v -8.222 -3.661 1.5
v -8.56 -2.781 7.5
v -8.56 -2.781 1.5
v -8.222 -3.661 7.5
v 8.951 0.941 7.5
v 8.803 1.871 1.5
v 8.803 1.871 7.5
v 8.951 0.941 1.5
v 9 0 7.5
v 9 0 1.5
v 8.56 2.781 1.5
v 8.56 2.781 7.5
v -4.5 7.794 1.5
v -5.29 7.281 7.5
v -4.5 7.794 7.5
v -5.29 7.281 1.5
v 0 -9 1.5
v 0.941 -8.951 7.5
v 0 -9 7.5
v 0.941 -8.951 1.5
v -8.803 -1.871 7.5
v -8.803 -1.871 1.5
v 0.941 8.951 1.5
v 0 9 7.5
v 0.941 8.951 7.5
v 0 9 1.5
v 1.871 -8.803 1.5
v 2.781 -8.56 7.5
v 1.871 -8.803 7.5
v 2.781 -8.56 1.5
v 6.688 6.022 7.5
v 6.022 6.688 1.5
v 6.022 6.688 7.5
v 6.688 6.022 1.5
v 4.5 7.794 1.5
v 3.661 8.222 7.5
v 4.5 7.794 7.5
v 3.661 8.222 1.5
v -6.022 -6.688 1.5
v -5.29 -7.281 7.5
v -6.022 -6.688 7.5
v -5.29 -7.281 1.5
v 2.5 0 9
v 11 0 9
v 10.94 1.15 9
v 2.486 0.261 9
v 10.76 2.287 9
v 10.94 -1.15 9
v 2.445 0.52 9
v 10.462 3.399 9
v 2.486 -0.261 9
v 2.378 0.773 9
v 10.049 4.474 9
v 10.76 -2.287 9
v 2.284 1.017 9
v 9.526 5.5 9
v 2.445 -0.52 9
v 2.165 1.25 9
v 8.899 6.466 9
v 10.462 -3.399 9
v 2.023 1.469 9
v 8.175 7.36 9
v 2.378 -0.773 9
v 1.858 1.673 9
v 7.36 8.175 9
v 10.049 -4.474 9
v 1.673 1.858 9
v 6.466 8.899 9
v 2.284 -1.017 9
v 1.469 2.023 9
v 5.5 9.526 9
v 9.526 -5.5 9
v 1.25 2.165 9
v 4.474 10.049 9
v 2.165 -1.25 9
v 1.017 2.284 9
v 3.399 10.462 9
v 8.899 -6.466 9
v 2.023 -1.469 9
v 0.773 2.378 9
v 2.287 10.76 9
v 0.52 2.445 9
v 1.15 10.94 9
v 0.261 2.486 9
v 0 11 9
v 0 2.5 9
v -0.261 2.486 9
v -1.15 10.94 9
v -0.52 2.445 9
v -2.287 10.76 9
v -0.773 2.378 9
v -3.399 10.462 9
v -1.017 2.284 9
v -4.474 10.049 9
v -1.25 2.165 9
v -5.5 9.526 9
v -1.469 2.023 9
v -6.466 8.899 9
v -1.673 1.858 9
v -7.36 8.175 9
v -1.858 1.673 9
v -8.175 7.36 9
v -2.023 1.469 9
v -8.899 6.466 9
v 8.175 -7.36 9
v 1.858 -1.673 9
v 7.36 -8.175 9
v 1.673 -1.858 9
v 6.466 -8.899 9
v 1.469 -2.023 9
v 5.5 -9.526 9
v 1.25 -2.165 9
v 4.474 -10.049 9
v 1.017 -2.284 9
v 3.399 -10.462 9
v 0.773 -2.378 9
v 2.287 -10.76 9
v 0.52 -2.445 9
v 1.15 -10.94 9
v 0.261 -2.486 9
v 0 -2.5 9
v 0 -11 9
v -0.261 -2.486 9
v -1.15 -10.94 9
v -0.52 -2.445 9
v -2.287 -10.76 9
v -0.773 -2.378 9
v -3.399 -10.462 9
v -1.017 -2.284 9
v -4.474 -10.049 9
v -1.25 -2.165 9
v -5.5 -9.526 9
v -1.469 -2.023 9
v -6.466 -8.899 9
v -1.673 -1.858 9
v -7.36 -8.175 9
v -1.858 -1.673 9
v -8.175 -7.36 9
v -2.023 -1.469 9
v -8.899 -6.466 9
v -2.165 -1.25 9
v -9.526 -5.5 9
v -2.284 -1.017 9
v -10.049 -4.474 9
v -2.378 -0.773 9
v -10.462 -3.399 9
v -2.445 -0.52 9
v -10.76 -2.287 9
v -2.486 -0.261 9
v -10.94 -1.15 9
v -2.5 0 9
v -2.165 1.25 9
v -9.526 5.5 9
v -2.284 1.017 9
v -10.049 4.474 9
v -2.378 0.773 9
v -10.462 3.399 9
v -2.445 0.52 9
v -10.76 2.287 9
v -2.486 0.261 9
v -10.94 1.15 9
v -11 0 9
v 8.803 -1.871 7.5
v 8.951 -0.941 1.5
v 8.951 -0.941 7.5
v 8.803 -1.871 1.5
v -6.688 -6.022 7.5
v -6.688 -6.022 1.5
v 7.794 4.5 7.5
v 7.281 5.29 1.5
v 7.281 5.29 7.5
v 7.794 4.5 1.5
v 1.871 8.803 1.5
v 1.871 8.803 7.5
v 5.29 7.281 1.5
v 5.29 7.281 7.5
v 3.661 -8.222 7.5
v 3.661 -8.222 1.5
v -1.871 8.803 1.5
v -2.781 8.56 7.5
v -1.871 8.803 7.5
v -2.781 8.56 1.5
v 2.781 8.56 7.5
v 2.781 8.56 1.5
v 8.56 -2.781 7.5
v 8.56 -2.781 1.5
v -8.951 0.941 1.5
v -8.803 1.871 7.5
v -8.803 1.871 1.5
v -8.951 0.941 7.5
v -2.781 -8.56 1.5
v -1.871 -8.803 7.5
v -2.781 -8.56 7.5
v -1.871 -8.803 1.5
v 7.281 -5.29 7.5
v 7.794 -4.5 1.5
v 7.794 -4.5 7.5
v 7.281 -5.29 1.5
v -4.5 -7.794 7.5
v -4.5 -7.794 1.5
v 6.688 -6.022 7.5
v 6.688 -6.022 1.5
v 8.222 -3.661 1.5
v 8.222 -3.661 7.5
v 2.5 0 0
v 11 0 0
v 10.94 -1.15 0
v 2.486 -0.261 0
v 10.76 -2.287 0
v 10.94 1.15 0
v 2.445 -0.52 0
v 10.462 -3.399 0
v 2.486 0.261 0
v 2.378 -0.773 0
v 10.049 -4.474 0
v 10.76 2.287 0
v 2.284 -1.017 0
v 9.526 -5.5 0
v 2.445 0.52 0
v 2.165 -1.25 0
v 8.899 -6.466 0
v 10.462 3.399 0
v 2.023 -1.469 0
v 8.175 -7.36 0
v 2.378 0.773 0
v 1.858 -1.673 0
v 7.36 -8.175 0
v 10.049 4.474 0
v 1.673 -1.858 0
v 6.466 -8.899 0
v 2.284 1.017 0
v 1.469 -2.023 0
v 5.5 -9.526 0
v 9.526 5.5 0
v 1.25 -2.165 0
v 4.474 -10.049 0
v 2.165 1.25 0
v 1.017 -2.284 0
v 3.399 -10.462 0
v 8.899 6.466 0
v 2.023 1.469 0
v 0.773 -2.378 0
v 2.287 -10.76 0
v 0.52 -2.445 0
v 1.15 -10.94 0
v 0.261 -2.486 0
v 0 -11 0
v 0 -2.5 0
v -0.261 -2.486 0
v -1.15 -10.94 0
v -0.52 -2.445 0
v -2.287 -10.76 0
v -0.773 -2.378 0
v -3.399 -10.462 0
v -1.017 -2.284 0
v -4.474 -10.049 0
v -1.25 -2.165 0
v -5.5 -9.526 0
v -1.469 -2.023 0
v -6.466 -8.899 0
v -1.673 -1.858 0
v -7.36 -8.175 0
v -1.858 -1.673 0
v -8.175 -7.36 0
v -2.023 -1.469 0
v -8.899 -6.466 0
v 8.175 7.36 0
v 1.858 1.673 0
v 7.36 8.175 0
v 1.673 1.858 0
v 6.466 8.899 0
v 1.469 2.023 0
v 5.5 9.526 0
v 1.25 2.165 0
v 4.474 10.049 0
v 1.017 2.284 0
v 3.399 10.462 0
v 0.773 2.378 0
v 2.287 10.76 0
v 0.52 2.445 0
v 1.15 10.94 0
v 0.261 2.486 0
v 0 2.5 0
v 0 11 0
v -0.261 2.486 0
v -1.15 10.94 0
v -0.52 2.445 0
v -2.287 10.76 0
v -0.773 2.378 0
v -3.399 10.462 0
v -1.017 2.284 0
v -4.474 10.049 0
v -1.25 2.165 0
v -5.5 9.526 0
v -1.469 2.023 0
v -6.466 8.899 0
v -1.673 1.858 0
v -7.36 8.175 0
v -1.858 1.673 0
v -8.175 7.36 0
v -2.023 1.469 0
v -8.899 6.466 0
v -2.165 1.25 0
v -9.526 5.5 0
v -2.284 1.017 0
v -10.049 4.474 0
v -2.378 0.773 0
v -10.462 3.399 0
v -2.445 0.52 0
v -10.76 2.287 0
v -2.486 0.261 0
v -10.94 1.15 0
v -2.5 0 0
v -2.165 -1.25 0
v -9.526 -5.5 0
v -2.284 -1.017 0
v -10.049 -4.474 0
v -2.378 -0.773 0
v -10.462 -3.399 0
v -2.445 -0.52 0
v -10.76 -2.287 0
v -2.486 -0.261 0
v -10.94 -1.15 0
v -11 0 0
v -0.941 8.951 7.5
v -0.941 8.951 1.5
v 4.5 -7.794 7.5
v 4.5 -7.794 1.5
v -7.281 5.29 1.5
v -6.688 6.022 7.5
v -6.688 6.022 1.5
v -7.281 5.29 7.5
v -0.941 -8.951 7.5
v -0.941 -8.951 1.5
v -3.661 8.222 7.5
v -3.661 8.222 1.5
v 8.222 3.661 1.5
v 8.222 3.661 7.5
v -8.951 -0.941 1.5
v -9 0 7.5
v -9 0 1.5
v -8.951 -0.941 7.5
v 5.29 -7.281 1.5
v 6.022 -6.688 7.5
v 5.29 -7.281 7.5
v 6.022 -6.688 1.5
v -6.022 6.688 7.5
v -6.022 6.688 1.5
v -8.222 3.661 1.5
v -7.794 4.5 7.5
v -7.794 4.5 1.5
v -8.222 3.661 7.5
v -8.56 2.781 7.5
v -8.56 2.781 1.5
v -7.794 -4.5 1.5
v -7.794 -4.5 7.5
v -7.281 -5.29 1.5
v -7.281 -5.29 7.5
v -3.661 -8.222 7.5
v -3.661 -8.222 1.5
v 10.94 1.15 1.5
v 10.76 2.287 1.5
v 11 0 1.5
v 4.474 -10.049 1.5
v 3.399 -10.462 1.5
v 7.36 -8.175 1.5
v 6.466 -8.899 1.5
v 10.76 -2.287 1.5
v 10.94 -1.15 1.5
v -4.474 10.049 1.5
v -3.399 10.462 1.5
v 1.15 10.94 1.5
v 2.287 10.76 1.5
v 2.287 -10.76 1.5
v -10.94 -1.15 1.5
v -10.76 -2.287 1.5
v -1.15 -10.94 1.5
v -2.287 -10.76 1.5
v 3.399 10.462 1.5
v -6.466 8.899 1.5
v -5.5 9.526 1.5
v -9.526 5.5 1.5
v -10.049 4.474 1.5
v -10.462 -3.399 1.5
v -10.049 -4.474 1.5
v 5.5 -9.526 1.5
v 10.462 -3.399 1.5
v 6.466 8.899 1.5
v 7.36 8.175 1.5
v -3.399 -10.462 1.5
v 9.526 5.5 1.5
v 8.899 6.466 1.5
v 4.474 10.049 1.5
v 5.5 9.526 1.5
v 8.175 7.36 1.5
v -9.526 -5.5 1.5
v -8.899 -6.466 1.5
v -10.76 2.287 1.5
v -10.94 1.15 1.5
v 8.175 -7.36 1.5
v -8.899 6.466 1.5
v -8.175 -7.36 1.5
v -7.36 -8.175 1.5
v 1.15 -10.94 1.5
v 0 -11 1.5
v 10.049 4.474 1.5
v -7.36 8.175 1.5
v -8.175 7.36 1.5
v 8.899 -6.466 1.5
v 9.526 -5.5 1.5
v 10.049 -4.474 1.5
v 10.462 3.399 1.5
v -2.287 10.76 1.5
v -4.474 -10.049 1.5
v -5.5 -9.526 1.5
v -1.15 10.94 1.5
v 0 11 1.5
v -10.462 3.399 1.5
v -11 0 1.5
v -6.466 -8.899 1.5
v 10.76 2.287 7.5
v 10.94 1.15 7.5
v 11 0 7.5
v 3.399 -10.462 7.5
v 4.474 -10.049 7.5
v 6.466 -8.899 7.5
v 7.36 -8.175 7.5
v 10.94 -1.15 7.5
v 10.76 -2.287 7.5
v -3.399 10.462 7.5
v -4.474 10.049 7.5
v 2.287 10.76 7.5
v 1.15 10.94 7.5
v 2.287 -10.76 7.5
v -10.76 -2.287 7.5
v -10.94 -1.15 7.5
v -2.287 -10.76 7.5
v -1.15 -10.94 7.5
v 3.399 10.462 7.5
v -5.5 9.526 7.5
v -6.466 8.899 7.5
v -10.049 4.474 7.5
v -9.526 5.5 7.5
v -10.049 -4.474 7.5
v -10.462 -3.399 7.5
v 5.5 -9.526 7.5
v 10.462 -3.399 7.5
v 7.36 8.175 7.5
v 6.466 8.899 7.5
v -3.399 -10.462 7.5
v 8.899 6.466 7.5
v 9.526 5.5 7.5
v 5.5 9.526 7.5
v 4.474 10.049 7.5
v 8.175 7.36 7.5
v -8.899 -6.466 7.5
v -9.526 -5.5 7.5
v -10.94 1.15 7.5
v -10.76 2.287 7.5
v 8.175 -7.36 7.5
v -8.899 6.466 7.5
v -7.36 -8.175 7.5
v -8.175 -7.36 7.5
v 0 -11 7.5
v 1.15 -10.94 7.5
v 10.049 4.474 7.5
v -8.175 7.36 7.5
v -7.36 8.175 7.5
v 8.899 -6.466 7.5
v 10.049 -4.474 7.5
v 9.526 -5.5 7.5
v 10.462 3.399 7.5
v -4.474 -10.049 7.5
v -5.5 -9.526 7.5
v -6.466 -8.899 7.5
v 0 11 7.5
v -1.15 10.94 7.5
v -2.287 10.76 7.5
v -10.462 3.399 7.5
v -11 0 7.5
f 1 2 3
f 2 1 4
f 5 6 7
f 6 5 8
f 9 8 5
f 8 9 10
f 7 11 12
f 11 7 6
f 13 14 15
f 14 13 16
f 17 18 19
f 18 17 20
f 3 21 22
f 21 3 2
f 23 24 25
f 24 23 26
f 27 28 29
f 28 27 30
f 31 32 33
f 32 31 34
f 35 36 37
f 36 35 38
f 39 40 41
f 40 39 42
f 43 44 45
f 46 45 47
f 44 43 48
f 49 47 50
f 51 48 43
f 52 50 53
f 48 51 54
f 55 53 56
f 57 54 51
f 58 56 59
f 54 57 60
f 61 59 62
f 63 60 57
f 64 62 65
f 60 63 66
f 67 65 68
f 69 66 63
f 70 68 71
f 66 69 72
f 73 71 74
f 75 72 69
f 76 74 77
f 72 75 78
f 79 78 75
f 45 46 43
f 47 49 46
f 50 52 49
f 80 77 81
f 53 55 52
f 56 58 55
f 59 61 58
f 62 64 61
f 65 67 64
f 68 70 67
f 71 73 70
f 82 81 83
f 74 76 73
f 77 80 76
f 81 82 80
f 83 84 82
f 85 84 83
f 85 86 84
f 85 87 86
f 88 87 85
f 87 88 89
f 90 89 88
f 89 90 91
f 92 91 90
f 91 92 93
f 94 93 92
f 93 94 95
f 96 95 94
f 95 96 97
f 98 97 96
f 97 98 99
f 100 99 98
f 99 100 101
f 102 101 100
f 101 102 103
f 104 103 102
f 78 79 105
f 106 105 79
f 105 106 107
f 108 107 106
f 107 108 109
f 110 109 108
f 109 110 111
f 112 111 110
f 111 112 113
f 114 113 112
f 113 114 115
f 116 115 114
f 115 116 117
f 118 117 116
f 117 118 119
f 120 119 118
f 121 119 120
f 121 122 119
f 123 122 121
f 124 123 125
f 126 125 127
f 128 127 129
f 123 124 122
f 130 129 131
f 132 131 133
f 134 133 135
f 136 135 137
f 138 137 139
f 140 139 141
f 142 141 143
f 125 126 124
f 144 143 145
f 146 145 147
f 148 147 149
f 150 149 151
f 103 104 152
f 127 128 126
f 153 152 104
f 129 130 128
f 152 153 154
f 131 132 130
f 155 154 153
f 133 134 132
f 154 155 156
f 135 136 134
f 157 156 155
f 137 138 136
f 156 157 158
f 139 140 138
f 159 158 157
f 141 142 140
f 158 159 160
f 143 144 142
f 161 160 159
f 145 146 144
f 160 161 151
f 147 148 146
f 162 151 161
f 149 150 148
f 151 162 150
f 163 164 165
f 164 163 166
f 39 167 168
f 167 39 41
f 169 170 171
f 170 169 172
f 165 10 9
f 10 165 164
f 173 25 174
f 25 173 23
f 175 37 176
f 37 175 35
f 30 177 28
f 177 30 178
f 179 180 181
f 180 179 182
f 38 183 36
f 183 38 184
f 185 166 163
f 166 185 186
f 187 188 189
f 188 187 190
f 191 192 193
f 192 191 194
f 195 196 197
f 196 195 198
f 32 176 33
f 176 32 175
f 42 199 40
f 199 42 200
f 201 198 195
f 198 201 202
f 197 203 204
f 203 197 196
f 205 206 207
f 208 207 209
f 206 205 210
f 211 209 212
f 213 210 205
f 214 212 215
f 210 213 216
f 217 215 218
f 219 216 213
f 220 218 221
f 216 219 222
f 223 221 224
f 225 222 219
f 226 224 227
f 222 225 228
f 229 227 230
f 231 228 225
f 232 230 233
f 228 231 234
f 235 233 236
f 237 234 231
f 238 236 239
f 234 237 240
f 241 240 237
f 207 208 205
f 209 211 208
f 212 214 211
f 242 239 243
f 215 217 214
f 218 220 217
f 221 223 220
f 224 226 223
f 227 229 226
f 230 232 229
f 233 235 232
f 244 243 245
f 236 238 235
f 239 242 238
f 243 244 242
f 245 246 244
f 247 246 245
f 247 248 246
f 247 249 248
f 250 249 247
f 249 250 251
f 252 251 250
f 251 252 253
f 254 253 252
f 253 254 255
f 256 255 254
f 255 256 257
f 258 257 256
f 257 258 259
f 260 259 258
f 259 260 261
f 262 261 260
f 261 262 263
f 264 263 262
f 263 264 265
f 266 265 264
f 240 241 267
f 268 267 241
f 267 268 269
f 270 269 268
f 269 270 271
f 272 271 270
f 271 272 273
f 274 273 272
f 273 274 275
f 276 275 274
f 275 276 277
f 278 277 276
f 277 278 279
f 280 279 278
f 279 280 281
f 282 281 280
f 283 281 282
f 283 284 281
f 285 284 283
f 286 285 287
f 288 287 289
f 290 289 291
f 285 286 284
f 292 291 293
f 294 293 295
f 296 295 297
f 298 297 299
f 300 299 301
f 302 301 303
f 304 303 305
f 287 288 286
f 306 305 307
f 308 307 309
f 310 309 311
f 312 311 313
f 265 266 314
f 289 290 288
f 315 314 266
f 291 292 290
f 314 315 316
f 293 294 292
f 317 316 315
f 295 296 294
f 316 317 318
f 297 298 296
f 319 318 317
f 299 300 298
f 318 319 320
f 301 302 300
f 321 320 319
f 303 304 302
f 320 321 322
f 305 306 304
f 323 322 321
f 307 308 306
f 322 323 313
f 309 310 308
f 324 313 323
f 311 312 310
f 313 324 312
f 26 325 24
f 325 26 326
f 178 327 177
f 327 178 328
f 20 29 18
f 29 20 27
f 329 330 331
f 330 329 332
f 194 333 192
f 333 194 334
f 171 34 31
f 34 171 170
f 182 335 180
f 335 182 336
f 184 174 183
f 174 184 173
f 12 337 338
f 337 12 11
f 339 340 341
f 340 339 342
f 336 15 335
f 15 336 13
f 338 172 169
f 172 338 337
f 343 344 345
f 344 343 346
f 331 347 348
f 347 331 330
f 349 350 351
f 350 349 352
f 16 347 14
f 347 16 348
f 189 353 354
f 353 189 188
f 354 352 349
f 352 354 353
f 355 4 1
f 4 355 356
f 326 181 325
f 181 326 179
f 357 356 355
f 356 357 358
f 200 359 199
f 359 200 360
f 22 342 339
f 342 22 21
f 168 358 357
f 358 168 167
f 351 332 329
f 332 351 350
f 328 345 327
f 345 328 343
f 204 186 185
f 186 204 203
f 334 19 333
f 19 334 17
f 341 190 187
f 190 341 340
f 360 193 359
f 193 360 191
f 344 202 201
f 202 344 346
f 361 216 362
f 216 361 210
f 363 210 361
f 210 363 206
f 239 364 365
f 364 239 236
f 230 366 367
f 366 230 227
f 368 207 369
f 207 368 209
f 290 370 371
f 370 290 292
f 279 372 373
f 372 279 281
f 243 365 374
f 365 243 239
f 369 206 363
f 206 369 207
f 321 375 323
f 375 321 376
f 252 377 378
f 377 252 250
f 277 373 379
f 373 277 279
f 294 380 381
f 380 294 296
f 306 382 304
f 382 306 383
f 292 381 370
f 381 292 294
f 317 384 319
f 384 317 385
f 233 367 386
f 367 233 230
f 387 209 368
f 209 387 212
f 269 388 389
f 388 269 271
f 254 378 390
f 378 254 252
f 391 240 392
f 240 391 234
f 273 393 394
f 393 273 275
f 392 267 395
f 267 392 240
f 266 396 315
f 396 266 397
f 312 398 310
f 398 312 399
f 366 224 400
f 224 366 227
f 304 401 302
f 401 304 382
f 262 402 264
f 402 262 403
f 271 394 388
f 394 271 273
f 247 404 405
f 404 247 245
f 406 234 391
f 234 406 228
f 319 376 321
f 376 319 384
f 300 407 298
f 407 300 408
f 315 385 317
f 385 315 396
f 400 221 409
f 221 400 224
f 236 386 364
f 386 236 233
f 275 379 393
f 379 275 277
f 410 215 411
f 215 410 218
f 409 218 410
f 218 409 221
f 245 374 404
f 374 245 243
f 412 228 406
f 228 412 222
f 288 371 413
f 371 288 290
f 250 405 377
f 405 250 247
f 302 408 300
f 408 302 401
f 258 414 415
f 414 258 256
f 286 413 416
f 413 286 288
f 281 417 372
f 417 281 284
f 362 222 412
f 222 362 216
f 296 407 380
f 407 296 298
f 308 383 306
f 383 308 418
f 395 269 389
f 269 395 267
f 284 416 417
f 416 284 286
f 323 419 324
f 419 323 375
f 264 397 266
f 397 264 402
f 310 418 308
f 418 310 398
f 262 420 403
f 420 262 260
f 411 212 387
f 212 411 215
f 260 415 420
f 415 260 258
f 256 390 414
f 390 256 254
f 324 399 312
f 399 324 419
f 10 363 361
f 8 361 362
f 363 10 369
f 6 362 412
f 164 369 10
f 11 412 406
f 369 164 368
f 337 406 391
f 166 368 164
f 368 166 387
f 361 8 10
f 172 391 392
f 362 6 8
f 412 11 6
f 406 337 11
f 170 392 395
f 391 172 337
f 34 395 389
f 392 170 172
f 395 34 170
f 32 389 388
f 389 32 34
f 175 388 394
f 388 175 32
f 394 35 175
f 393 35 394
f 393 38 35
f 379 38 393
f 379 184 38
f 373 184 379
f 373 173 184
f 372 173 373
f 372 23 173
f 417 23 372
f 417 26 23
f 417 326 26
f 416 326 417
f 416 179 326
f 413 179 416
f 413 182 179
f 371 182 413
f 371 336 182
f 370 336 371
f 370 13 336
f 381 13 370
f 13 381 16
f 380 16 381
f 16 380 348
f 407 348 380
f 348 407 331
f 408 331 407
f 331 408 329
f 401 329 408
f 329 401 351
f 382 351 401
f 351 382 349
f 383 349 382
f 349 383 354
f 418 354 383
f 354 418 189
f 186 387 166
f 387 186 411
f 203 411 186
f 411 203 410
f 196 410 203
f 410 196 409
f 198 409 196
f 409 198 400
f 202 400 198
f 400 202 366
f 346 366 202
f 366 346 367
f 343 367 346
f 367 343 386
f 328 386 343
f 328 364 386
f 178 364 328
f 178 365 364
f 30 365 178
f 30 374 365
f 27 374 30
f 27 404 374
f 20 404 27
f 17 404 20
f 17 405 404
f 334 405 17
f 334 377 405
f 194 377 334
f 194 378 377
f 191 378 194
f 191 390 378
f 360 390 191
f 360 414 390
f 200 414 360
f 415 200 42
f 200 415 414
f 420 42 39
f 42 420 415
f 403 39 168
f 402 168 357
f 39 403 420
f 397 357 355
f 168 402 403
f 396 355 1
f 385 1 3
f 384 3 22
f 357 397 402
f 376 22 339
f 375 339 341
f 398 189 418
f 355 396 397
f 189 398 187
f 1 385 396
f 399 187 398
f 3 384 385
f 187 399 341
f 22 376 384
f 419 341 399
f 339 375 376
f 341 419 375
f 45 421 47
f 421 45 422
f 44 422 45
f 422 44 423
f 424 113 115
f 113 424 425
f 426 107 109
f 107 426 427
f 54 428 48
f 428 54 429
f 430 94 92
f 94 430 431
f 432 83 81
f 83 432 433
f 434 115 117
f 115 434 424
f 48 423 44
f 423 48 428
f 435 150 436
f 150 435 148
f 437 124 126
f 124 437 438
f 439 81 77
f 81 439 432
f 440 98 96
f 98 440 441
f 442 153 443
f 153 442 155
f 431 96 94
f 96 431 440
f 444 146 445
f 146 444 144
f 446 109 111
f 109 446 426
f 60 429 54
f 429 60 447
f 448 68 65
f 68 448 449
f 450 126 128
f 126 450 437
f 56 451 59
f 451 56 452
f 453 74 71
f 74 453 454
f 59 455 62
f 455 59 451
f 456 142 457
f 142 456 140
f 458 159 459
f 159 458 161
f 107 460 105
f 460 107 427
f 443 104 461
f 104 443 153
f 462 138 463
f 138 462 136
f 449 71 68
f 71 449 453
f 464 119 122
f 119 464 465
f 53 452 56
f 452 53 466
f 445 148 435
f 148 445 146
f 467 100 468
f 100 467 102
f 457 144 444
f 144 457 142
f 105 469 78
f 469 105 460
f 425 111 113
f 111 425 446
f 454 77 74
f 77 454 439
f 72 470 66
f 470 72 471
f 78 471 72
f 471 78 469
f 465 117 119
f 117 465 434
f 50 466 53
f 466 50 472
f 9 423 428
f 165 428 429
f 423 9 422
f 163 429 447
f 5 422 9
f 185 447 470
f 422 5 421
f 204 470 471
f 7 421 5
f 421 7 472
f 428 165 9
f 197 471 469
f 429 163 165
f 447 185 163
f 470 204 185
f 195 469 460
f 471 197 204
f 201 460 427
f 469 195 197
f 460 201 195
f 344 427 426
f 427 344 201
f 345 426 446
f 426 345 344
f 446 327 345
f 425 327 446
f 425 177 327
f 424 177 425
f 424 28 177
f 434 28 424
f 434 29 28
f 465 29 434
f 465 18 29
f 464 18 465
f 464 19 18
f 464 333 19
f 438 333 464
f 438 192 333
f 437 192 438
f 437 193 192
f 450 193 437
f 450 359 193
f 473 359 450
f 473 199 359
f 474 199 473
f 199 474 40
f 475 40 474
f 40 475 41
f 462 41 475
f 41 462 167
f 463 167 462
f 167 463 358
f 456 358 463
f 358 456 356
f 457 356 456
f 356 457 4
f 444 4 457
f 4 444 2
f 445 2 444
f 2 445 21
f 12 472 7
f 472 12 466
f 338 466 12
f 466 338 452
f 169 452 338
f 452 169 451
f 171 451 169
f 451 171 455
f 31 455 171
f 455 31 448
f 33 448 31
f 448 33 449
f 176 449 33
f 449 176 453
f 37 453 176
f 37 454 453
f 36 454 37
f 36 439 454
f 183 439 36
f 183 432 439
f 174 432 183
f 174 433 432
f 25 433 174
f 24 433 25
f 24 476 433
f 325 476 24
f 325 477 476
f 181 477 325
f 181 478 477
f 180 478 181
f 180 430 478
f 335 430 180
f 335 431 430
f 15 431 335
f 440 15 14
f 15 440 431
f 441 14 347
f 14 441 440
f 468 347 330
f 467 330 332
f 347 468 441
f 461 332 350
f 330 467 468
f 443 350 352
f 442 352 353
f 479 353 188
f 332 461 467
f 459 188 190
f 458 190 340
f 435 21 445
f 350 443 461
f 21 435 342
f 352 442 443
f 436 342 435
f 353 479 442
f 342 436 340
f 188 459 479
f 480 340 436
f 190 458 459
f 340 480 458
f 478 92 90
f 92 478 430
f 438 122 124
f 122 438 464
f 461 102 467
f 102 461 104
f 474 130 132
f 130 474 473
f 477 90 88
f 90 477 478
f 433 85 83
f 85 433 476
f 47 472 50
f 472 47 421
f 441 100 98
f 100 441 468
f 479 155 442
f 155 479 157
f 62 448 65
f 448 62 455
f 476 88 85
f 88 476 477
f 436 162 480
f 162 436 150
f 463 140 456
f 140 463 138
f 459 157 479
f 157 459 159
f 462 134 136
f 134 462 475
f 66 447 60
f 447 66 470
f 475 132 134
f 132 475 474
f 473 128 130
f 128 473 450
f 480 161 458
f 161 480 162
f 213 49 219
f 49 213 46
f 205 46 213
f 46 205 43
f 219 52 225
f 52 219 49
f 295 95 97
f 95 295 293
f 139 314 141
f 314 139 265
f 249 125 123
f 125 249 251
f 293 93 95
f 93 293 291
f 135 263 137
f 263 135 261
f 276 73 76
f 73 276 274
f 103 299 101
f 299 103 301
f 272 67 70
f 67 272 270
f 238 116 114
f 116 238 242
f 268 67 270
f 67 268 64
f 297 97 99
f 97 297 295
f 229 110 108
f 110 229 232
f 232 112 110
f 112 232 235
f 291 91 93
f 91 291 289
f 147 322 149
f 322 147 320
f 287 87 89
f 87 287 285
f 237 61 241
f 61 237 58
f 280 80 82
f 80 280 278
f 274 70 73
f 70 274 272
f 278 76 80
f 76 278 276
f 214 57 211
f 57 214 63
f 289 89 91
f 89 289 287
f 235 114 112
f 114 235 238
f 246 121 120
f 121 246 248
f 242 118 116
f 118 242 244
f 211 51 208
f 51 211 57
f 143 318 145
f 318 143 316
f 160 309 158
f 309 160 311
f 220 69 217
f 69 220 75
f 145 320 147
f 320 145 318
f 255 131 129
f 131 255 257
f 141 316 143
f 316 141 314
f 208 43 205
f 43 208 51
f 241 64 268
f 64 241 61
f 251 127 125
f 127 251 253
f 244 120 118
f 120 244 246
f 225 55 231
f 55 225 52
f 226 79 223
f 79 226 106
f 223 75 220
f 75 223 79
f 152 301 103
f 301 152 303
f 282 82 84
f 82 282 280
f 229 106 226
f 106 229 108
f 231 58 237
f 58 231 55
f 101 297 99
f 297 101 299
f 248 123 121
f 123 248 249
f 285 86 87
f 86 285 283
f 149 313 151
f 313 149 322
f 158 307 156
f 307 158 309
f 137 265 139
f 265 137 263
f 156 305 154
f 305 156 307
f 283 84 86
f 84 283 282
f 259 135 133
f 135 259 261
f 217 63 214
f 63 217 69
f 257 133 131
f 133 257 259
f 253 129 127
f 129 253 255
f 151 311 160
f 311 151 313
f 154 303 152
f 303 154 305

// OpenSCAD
// Plain idler pulley with retaining flanges.
$fn = 60;
eps = 0.02;
bore_d = 5;
body_d = 18;
width = 9;
flange_t = 1.5;
difference() {
    union() {
        cylinder(d=body_d,h=width);
        cylinder(d=body_d+4,h=flange_t);
        translate([0,0,width-flange_t]) cylinder(d=body_d+4,h=flange_t);
    }
    translate([0,0,-eps]) cylinder(d=bore_d,h=width+2*eps);
}
